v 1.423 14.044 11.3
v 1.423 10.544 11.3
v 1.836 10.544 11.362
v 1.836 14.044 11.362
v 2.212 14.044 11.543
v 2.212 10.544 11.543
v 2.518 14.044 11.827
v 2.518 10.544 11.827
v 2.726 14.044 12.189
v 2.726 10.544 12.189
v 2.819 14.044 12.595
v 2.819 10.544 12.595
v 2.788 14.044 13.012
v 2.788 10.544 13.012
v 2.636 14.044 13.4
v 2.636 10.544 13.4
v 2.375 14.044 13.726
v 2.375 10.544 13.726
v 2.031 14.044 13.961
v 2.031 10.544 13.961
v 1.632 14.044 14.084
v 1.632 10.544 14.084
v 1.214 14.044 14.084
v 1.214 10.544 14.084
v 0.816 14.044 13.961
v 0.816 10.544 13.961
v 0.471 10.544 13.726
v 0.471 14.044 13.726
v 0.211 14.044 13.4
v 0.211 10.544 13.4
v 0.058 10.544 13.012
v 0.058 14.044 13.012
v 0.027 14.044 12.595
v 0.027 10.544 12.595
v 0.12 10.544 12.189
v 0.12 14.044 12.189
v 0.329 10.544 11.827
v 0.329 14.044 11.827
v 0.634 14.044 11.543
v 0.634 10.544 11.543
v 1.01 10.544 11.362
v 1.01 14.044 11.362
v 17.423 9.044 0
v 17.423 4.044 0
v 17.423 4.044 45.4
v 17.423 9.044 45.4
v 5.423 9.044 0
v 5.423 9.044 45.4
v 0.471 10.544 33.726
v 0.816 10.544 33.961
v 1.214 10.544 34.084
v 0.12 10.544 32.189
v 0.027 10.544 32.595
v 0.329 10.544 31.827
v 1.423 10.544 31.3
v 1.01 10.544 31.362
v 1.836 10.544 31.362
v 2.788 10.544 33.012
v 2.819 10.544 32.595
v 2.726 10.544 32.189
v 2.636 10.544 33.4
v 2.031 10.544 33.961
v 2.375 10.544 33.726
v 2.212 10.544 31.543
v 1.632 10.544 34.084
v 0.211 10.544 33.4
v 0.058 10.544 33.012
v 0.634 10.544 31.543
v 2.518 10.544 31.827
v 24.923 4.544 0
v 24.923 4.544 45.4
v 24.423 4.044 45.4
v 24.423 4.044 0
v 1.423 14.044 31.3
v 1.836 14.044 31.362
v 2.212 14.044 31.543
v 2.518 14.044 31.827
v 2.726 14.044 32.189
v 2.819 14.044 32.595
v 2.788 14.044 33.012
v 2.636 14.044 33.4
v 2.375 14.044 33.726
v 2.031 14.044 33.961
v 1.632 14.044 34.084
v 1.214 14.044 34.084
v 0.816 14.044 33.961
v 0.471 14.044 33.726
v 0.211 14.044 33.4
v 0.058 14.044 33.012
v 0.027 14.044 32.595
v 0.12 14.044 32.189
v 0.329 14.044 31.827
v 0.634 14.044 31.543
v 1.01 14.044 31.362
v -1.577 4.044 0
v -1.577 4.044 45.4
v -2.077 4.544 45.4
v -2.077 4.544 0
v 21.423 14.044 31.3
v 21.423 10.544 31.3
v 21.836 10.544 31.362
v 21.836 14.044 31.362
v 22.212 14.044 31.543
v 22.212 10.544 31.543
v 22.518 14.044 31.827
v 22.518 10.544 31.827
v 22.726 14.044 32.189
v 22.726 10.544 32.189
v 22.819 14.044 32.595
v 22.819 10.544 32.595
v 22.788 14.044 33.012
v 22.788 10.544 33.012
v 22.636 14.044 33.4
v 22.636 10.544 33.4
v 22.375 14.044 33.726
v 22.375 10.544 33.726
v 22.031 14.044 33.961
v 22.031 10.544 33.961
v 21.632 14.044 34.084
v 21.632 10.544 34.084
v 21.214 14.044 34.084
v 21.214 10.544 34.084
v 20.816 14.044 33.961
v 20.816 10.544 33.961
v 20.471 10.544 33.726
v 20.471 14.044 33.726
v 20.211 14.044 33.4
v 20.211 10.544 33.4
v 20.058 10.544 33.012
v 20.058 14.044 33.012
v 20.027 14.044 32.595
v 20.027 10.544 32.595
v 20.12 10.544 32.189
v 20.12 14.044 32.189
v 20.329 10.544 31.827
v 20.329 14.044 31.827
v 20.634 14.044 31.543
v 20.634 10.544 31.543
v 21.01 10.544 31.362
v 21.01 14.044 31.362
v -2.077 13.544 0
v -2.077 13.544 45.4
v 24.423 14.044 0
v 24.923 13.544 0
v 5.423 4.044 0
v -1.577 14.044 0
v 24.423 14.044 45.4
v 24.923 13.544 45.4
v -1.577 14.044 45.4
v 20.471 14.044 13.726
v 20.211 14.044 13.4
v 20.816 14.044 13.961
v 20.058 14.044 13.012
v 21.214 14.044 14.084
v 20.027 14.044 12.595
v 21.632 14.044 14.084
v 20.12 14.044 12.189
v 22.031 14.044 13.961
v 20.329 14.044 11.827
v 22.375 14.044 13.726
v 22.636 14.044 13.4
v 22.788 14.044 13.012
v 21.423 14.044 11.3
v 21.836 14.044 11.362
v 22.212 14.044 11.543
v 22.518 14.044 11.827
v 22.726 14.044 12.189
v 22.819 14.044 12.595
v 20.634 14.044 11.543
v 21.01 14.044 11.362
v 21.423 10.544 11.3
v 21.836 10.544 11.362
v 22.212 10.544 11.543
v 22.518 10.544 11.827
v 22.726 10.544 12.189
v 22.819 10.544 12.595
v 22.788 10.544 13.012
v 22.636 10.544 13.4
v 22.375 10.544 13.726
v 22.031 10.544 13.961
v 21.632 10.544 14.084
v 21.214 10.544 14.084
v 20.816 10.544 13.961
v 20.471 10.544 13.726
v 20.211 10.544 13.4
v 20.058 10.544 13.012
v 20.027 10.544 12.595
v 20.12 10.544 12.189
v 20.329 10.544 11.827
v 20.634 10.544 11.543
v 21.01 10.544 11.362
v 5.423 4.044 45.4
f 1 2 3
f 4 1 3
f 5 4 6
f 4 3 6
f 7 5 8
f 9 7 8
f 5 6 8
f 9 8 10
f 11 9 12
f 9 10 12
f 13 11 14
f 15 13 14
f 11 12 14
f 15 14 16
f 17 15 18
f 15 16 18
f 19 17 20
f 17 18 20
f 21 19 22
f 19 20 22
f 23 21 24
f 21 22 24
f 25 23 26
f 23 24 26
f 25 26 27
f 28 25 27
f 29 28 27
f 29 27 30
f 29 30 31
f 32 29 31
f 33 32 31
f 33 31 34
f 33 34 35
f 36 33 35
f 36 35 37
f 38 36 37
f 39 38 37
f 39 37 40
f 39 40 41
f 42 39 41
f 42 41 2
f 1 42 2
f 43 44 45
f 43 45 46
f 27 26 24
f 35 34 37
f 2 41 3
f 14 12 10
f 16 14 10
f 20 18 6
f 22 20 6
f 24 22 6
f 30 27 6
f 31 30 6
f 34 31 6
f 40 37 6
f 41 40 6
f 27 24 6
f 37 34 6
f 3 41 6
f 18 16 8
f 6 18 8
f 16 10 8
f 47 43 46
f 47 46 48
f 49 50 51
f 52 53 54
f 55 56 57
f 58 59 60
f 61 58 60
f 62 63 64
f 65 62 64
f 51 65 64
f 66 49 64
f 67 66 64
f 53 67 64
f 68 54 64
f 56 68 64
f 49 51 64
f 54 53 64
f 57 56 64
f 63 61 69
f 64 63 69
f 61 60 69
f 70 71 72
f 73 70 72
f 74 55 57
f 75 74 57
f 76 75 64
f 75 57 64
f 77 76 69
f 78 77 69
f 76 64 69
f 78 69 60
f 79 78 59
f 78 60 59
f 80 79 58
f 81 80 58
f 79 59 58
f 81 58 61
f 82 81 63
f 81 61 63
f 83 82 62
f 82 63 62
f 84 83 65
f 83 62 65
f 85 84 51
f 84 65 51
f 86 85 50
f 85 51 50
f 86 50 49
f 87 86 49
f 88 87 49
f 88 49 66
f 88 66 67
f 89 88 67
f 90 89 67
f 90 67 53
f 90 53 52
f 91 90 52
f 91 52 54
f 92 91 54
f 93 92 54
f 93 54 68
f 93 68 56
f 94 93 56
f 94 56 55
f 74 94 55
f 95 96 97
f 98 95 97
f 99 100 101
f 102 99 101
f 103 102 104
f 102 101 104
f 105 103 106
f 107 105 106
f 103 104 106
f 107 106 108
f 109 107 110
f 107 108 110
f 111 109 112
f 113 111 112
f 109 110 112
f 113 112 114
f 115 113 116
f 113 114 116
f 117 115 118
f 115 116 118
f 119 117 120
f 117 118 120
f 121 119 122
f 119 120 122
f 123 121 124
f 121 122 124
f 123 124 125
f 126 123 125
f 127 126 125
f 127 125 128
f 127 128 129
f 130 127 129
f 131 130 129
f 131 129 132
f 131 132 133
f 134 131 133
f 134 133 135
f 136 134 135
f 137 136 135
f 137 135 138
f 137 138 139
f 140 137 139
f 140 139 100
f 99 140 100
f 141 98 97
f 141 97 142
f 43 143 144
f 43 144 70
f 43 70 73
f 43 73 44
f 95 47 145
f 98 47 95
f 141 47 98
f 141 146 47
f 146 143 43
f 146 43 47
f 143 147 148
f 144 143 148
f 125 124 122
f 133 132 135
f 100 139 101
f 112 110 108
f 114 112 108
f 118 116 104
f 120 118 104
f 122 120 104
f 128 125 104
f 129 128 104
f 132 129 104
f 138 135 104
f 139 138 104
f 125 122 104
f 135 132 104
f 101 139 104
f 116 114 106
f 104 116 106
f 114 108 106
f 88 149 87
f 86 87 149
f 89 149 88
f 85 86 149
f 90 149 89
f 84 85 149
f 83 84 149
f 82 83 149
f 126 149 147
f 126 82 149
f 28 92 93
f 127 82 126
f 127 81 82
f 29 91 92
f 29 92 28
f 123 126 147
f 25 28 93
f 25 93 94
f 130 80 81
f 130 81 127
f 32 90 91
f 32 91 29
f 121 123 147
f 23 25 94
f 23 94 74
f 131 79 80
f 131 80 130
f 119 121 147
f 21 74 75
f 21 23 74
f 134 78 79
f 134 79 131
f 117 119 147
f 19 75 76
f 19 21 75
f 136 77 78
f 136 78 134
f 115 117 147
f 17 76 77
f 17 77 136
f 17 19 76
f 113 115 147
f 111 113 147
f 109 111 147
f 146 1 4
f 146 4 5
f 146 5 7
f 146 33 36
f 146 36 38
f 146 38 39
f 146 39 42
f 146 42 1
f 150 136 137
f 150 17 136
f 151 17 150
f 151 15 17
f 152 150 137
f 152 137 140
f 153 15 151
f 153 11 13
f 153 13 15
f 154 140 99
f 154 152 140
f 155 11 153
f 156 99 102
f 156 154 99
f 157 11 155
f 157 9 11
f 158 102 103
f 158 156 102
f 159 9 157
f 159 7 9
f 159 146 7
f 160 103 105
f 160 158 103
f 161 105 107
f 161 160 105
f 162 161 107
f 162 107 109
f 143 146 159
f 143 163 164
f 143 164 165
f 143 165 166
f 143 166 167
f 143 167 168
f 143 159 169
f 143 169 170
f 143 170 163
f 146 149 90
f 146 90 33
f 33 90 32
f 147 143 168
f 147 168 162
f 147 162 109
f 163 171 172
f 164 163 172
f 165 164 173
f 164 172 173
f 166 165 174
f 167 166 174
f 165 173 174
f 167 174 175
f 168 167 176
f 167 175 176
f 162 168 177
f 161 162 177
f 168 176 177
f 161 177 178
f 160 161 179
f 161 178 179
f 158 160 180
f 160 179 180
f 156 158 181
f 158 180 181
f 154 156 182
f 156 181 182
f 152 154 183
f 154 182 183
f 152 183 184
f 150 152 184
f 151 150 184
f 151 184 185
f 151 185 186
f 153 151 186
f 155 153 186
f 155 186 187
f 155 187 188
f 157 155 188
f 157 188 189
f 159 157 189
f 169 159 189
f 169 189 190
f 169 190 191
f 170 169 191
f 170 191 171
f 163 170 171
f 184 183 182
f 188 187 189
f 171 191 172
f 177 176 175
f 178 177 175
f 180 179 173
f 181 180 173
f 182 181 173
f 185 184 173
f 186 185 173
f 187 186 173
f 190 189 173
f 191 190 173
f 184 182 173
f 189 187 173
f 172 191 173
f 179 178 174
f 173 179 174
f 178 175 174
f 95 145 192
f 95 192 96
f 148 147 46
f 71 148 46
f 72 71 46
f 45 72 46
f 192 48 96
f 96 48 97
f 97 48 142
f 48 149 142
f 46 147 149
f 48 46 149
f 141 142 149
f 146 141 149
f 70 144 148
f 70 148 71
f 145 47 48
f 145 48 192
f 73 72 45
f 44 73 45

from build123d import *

# Parameters (mm, degrees)
EXTRUDE_1_DEPTH     = 45.4
HOLE_WIZARD_2_D     = 2.8
HOLE_WIZARD_2_DEPTH = 3.5


with BuildPart() as part:
    # 草图1 → 凸台-拉伸1 (new body)
    with BuildSketch(Plane.XY):
        Polygon((-1.576923077, 14.043956044), (24.423076923, 14.043956044), (24.923076923, 13.543956044), (24.923076923, 4.543956044), (24.423076923, 4.043956044), (17.423076923, 4.043956044), (17.423076923, 9.043956044), (5.423076923, 9.043956044), (5.423076923, 4.043956044), (-1.576923077, 4.043956044), (-2.076923077, 4.543956044), (-2.076923077, 13.543956044), align=None)
    extrude(amount=EXTRUDE_1_DEPTH)

    # 孔2
    with Locations(Plane(origin=(21.423076923, 14.043956044, 32.7), x_dir=(0, 0, 1), z_dir=(0, 1, 0))):
        with Locations((0, 0), (-20, 0), (-20, -20), (0, -20)):
            Hole(HOLE_WIZARD_2_D / 2, depth=HOLE_WIZARD_2_DEPTH)


solid = part.part
